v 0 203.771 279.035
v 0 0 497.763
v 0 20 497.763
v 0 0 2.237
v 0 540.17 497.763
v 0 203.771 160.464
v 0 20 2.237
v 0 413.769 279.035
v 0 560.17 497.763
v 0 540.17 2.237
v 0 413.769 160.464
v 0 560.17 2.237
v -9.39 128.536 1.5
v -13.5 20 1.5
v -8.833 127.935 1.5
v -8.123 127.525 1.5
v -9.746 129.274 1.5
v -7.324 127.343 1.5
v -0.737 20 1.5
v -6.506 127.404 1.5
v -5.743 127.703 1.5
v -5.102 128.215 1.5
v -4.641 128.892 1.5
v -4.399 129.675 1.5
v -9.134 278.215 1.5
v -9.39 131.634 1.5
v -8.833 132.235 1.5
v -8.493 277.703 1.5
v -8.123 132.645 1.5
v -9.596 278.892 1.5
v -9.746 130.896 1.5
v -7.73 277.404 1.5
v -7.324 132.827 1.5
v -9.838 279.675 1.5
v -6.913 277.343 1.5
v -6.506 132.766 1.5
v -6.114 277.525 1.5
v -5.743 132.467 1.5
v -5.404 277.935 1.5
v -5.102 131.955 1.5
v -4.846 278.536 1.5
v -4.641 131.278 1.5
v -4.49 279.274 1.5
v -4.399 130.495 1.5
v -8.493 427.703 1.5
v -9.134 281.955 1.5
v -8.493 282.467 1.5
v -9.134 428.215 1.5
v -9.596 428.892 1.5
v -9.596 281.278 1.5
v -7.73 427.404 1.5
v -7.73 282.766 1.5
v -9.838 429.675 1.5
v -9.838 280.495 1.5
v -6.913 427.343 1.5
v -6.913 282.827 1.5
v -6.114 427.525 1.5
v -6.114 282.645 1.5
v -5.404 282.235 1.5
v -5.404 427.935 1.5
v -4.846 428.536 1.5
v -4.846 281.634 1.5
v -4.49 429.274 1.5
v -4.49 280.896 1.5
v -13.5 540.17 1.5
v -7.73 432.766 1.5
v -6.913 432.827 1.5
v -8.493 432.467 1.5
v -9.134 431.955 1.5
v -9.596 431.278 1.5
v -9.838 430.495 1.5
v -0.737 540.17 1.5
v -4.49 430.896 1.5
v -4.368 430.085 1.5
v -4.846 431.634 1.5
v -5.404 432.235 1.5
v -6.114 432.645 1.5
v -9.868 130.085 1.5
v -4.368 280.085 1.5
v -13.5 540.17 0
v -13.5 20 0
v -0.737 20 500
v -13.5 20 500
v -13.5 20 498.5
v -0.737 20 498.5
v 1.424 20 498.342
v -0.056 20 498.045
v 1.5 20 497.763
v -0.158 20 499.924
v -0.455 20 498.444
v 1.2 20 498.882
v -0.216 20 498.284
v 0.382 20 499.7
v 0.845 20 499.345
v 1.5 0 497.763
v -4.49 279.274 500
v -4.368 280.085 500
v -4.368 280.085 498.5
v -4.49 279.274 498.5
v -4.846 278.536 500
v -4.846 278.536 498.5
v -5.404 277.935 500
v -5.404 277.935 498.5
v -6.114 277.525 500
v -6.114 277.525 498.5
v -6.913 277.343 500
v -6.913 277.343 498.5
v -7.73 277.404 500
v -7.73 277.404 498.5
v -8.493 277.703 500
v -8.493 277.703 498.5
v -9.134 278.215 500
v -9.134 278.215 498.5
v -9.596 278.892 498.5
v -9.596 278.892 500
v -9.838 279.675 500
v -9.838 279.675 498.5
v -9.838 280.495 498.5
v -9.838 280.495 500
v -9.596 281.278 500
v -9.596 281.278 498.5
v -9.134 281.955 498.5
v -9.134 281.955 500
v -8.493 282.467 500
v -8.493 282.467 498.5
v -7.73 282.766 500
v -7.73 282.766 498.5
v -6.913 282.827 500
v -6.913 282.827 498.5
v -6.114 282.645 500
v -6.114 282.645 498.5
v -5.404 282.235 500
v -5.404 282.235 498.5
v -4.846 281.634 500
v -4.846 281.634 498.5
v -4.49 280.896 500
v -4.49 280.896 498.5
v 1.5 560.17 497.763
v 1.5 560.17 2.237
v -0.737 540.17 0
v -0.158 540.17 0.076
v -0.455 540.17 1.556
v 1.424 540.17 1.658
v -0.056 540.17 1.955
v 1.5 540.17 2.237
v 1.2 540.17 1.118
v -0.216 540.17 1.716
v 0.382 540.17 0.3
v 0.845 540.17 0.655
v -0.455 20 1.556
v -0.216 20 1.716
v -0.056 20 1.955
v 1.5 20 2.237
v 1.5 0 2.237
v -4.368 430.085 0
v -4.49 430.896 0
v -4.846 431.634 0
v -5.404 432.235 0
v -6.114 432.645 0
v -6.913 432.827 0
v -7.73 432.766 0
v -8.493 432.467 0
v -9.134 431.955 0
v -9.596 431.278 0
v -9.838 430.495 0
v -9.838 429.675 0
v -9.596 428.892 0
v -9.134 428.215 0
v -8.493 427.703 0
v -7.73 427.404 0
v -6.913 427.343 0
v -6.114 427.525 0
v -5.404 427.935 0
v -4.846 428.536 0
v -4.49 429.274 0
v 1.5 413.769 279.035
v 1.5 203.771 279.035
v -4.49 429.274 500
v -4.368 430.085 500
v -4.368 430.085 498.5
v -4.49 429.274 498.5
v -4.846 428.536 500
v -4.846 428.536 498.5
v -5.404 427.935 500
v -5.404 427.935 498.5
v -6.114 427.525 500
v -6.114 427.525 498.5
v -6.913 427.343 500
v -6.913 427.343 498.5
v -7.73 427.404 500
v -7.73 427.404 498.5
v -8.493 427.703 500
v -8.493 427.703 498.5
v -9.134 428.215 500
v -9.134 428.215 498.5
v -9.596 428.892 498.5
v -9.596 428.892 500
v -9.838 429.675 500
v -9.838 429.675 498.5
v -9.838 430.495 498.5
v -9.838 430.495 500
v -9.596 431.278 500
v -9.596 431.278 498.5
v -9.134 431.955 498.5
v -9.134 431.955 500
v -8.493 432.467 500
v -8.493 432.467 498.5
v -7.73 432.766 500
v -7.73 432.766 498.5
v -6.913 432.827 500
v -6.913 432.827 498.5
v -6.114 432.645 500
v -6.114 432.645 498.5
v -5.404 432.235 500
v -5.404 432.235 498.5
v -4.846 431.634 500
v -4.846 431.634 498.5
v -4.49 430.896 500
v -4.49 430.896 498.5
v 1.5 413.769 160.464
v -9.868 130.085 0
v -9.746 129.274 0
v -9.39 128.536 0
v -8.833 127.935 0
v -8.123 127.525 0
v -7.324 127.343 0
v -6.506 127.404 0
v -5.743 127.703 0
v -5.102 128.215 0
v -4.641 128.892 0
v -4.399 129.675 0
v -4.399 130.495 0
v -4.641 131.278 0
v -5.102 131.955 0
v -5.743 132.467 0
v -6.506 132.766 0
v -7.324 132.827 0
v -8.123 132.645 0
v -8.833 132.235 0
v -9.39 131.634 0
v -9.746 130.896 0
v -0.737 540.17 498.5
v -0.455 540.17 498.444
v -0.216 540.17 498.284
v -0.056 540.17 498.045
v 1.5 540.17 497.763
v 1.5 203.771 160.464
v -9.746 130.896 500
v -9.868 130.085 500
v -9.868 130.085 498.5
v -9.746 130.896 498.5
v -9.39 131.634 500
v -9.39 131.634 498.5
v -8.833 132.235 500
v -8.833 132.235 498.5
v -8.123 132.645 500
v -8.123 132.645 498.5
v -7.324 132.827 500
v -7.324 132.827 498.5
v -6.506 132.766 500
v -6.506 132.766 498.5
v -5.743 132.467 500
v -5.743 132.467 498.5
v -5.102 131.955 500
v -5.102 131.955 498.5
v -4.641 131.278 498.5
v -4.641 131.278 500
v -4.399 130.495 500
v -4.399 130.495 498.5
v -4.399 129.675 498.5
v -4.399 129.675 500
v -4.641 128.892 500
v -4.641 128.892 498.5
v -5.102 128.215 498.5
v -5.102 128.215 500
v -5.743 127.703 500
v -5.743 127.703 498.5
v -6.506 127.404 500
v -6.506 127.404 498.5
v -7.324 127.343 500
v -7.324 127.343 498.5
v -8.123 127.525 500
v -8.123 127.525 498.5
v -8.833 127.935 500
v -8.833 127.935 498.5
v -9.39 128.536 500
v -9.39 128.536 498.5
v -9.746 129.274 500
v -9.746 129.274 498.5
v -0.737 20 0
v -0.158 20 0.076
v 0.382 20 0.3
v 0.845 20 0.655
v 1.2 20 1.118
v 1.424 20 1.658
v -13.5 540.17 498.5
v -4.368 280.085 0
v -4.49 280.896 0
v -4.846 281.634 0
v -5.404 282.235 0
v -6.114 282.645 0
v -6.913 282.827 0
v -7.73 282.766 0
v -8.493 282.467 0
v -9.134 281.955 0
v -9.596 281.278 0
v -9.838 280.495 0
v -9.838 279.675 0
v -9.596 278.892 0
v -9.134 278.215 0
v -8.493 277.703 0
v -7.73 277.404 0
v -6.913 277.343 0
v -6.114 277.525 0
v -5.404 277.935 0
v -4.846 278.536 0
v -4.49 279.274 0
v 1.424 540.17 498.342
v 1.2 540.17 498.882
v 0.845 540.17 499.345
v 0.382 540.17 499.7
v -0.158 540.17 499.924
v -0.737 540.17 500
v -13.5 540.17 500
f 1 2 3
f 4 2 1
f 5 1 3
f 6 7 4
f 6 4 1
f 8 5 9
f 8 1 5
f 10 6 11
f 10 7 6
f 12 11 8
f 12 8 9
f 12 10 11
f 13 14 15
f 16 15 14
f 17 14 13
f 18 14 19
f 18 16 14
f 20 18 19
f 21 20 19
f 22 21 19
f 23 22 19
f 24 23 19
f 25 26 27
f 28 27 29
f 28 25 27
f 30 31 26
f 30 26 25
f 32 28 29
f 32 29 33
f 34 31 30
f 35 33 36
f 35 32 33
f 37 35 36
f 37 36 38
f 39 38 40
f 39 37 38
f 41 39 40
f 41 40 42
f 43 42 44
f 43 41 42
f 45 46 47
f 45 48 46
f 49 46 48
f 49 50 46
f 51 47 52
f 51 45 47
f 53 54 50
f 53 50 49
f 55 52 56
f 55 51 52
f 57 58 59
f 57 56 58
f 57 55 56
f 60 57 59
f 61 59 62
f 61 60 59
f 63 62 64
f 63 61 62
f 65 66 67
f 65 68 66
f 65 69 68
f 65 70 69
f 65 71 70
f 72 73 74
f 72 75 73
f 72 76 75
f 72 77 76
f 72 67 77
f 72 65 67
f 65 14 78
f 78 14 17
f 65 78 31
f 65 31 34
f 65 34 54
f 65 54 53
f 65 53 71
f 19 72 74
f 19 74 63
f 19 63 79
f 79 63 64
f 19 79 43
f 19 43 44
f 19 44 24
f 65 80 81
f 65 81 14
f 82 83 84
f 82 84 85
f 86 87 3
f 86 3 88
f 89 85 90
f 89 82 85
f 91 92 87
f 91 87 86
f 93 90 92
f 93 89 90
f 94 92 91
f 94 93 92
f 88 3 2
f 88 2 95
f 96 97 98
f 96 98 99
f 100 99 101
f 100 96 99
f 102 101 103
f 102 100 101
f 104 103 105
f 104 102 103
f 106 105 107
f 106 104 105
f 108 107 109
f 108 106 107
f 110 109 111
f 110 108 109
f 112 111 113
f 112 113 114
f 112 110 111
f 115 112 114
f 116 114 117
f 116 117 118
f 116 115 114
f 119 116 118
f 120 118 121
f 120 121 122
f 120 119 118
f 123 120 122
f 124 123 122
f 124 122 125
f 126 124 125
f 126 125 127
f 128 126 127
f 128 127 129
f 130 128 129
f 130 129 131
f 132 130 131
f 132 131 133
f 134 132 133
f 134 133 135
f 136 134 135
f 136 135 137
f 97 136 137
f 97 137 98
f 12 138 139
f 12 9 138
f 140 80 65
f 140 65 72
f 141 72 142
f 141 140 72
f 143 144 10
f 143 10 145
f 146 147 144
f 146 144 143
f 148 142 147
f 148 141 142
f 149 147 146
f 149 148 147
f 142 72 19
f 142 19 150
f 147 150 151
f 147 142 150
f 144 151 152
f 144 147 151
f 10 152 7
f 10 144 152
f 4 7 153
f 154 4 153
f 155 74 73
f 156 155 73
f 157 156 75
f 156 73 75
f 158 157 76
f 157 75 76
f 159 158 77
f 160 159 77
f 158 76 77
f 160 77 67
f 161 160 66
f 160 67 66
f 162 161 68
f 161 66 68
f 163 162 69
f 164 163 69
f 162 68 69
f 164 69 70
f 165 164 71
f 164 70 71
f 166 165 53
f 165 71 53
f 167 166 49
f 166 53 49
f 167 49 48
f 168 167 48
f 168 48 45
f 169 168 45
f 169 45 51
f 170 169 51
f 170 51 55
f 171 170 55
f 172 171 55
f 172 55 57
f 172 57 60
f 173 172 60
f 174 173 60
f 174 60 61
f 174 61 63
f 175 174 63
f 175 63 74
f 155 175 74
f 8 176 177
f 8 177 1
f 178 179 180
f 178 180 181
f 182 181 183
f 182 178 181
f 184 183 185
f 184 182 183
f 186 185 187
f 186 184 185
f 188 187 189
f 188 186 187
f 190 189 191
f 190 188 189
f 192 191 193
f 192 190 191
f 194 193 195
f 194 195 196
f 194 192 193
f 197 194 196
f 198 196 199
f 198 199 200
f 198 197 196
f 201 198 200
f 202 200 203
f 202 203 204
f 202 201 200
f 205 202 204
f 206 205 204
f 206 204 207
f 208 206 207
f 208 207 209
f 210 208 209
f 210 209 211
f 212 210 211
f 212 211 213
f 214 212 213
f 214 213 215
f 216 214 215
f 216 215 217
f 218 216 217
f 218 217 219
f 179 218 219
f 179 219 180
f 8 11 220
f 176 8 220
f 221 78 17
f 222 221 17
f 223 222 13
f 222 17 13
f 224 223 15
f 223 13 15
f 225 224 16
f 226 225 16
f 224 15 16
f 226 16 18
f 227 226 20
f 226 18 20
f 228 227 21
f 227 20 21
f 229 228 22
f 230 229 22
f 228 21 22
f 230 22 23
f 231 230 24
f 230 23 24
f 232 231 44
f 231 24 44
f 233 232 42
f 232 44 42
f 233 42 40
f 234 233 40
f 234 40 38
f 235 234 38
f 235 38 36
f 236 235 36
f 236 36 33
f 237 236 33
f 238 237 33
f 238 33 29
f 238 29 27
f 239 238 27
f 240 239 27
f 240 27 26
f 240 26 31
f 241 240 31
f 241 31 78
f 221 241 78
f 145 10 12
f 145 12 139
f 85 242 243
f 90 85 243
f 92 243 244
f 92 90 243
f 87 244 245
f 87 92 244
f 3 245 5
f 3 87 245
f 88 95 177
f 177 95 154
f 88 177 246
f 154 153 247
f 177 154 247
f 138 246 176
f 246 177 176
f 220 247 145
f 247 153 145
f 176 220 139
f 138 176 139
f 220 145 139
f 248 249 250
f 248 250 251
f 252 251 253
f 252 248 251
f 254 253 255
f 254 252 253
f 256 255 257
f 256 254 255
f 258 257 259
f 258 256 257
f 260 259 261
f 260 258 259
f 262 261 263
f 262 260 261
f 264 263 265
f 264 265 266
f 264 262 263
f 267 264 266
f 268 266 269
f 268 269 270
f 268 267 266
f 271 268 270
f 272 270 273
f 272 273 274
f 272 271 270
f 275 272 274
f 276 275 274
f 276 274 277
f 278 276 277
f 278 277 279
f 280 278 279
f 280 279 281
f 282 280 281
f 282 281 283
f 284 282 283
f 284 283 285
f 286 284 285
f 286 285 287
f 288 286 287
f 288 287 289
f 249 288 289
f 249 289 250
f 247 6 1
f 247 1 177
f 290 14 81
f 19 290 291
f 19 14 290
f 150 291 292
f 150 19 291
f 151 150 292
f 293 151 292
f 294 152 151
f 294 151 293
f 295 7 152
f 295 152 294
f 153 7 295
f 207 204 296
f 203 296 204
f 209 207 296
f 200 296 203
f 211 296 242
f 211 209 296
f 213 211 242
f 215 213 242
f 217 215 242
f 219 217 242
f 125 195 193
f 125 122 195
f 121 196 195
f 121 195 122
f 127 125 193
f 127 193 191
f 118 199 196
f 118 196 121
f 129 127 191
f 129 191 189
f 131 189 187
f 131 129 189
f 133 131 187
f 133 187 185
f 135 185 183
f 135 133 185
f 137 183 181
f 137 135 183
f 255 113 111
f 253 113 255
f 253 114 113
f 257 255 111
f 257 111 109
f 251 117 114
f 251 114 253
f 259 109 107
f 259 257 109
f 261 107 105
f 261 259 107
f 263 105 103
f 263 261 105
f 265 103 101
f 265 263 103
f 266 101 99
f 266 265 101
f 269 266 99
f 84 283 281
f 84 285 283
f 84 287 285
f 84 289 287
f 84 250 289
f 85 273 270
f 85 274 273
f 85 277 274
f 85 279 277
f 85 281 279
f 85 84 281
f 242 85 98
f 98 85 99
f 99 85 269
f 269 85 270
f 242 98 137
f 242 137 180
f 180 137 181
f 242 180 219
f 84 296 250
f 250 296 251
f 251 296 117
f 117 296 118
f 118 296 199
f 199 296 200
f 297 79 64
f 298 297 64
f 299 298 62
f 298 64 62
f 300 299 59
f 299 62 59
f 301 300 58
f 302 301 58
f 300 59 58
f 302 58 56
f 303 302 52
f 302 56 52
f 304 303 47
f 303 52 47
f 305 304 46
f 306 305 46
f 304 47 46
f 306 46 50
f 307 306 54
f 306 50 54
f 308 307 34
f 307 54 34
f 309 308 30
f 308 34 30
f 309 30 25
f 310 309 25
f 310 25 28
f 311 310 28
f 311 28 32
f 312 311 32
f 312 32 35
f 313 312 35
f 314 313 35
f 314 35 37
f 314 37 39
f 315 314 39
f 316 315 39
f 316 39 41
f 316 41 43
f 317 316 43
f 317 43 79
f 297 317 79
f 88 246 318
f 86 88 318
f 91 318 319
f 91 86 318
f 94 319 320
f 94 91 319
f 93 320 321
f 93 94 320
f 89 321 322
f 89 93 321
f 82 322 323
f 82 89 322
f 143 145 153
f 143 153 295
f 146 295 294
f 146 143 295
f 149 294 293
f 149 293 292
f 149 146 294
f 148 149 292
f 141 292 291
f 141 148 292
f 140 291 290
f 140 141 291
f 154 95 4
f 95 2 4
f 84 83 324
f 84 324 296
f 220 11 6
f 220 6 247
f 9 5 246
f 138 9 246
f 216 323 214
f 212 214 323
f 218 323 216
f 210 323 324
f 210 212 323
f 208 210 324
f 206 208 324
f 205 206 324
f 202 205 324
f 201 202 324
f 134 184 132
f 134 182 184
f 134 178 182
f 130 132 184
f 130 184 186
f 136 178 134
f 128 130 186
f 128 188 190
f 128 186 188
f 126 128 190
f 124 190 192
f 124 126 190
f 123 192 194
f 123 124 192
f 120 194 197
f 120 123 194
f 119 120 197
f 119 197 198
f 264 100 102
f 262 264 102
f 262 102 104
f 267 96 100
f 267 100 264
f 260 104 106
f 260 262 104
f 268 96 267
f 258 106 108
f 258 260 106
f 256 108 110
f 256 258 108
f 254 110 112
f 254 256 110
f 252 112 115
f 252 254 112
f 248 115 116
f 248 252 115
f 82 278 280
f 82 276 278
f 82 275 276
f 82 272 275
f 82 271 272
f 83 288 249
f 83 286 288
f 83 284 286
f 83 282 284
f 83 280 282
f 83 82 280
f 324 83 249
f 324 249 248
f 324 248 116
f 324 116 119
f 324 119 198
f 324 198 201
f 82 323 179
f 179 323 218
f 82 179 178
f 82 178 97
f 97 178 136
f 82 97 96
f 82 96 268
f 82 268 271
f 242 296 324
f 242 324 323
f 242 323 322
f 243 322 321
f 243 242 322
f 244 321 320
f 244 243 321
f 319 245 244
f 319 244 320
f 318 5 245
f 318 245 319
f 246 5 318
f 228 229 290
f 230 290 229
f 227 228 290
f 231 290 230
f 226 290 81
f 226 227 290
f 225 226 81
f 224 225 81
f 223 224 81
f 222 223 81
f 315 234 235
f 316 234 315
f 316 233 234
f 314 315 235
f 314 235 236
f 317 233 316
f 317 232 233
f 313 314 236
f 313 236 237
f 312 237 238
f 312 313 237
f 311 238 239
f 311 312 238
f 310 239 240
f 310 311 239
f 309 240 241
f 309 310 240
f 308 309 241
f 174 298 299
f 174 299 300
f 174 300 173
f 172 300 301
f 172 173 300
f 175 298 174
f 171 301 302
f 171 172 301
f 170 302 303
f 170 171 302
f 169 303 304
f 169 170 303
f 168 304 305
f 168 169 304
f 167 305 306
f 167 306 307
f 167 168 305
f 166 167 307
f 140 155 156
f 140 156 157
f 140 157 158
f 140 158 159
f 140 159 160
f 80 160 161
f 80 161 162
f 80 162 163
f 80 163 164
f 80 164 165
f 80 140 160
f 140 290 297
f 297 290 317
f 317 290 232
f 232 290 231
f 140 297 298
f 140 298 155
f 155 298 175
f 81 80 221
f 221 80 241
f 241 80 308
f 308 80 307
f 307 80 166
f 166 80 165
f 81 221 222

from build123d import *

# Parameters (mm, degrees)
SKETCH_1_W                       = 1.5
SKETCH_1_H                       = 560.17
SM_BASE_FLANGE_1_DEPTH           = 500
SKETCH_6_W                       = 317.570371398
SKETCH_6_H                       = 336.908787646
CUT_EXTRUDE_1_DEPTH              = 10
SKETCH_7_W                       = 1.5
SKETCH_7_H                       = 317.570371398
EXTRUDE_1_DEPTH                  = 34.77
SKETCH_8_W                       = 1.5
SKETCH_8_H                       = 317.570371398
EXTRUDE_2_DEPTH                  = 92.14
SKETCH_9_W                       = 1.5
SKETCH_9_H                       = 209.998787646
EXTRUDE_3_DEPTH                  = 126
SKETCH_10_W                      = 1.5
SKETCH_10_H                      = 209.998787646
EXTRUDE_4_DEPTH                  = 73
SM_EDGE_FLANGE_1_STRIP_W         = 7.4732
SM_EDGE_FLANGE_1_STRIP_H         = 1.5
SM_EDGE_FLANGE_1_STRIP_CUT_DEPTH = 560.17
SM_EDGE_FLANGE_1_DEPTH           = 560.17
SM_EDGE_FLANGE_2_STRIP_W         = 7.4732
SM_EDGE_FLANGE_2_STRIP_H         = 1.5
SM_EDGE_FLANGE_2_STRIP_CUT_DEPTH = 560.17
SM_EDGE_FLANGE_2_DEPTH           = 560.17
SKETCH_19_W                      = 22.446307896
SKETCH_19_H                      = 4.345643328
SKETCH_19_H_2                    = 10.457116237
CUT_EXTRUDE_2_DEPTH              = 20
SKETCH_20_W                      = 19.209439619
SKETCH_20_H                      = 11.495536561
SKETCH_20_W_2                    = 27.208670792
SKETCH_20_H_2                    = 7.195465163
CUT_EXTRUDE_3_DEPTH              = 20
SKETCH_21_R                      = 2.75
CUT_EXTRUDE_4_DEPTH              = 20
CUT_EXTRUDE_START                = -10
SKETCH_22_R                      = 2.75
CUT_EXTRUDE_5_DEPTH              = 10


# Sheet-metal steps are written as plain solids
with BuildPart() as part:
    # Sketch 1 → 基体-法兰1 (new body)
    with BuildSketch(Plane.XY):
        with Locations((0.75, 280.085)):
            Rectangle(SKETCH_1_W, SKETCH_1_H)
    extrude(amount=SM_BASE_FLANGE_1_DEPTH)

    # 草图6 → 切除-拉伸1 (cut)
    with BuildSketch(Plane(origin=(1.5, 0, 0), x_dir=(0, 0, -1), z_dir=(1, 0, 0))):
        with Locations((-246.249491055, 280.085)):
            Rectangle(SKETCH_6_W, SKETCH_6_H)
    extrude(amount=-CUT_EXTRUDE_1_DEPTH, mode=Mode.SUBTRACT)

    # 草图7 → 凸台-拉伸1 (add)
    with BuildSketch(Plane.XZ.offset(-448.539393823)):
        with Locations((0.75, 246.249491055)):
            Rectangle(SKETCH_7_W, SKETCH_7_H)
    extrude(amount=EXTRUDE_1_DEPTH)

    # 草图8 → 凸台-拉伸2 (add)
    with BuildSketch(Plane(origin=(0, 111.630606177, 0), x_dir=(1, 0, 0), z_dir=(0, 1, 0))):
        with Locations((0.75, -246.249491055)):
            Rectangle(SKETCH_8_W, SKETCH_8_H)
    extrude(amount=EXTRUDE_2_DEPTH)

    # 草图9 → 凸台-拉伸3 (add)
    with BuildSketch(Plane(origin=(0, 0, 405.034676754), x_dir=(-1, 0, 0), z_dir=(0, 0, -1))):
        with Locations((-0.75, 308.77)):
            Rectangle(SKETCH_9_W, SKETCH_9_H)
    extrude(amount=EXTRUDE_3_DEPTH)

    # 草图10 → 凸台-拉伸4 (add)
    with BuildSketch(Plane.XY.offset(87.464305356)):
        with Locations((0.75, 308.77)):
            Rectangle(SKETCH_10_W, SKETCH_10_H)
    extrude(amount=EXTRUDE_4_DEPTH)

    # 边线-法兰1 strip (across the edge) → 边线-法兰1 strip cut (cut)
    with BuildSketch(Plane(origin=(0, 0, 500), x_dir=(0, 0, -1), z_dir=(0, 1, 0))):
        with Locations((-1.5, -0.75)):
            Rectangle(SM_EDGE_FLANGE_1_STRIP_W, SM_EDGE_FLANGE_1_STRIP_H)
    extrude(amount=SM_EDGE_FLANGE_1_STRIP_CUT_DEPTH, mode=Mode.SUBTRACT)

    # 边线-法兰1 section (across the edge) → 边线-法兰1 (add)
    with BuildSketch(Plane(origin=(0, 0, 500), x_dir=(0, 0, -1), z_dir=(0, 1, 0))):
        with BuildLine():
            Line((0, 0.7366), (0, 13.5))
            Line((0, 13.5), (1.5, 13.5))
            Line((1.5, 13.5), (1.5, 0.7366))
            ThreePointArc((1.5, 0.7366), (1.715745145, 0.215745145), (2.2366, 0))
            Line((2.2366, 0), (2.2366, -1.5))
            ThreePointArc((2.2366, -1.5), (0.655084973, -0.844915027), (0, 0.7366))
        make_face()
    extrude(amount=SM_EDGE_FLANGE_1_DEPTH)

    # 边线-法兰2 strip (across the edge) → 边线-法兰2 strip cut (cut)
    with BuildSketch(Plane(origin=(0, 560.17, 0), x_dir=(0, 0, 1), z_dir=(0, -1, 0))):
        with Locations((-1.5, -0.75)):
            Rectangle(SM_EDGE_FLANGE_2_STRIP_W, SM_EDGE_FLANGE_2_STRIP_H)
    extrude(amount=SM_EDGE_FLANGE_2_STRIP_CUT_DEPTH, mode=Mode.SUBTRACT)

    # 边线-法兰2 section (across the edge) → 边线-法兰2 (add)
    with BuildSketch(Plane(origin=(0, 560.17, 0), x_dir=(0, 0, 1), z_dir=(0, -1, 0))):
        with BuildLine():
            Line((0, 0.7366), (0, 13.5))
            Line((0, 13.5), (1.5, 13.5))
            Line((1.5, 13.5), (1.5, 0.7366))
            ThreePointArc((1.5, 0.7366), (1.715745145, 0.215745145), (2.2366, 0))
            Line((2.2366, 0), (2.2366, -1.5))
            ThreePointArc((2.2366, -1.5), (0.655084973, -0.844915027), (0, 0.7366))
        make_face()
    extrude(amount=SM_EDGE_FLANGE_2_DEPTH)

    # 草图19 → 切除-拉伸2 (cut)
    with BuildSketch(Plane.XZ):
        with Locations((-9.723153948, 0.063778336)):
            Rectangle(SKETCH_19_W, SKETCH_19_H)
        with Locations((-9.723153948, 502.991958119)):
            Rectangle(SKETCH_19_W, SKETCH_19_H_2)
    extrude(amount=-CUT_EXTRUDE_2_DEPTH, mode=Mode.SUBTRACT)

    # 草图20 → 切除-拉伸3 (cut)
    with BuildSketch(Plane(origin=(0, 560.17, 0), x_dir=(1, 0, 0), z_dir=(0, 1, 0))):
        with Locations((-8.10471981, -503.511168281)):
            Rectangle(SKETCH_20_W, SKETCH_20_H)
        with Locations((-12.104335396, 1.361132582)):
            Rectangle(SKETCH_20_W_2, SKETCH_20_H_2)
    extrude(amount=-CUT_EXTRUDE_3_DEPTH, mode=Mode.SUBTRACT)

    # 草图21 → 切除-拉伸4 (cut)
    with BuildSketch(Plane.XY.offset(1.5)):
        with Locations((-7.1183, 430.085)):
            Circle(SKETCH_21_R)
        with Locations((-7.1183, 280.085)):
            Circle(SKETCH_21_R)
        with Locations(Location((-7.1183, 130.085, 0), (0, 0, 180))):
            Circle(SKETCH_21_R)
    extrude(amount=-CUT_EXTRUDE_4_DEPTH, mode=Mode.SUBTRACT)

    # 草图22 → 切除-拉伸5 (cut)
    with BuildSketch(Plane(origin=(0, 0, 498.5), x_dir=(-1, 0, 0), z_dir=(0, 0, -1)).offset(CUT_EXTRUDE_START)):
        with Locations(Location((7.1183, 430.085, 0), (0, 0, 180))):
            Circle(SKETCH_22_R)
        with Locations(Location((7.1183, 280.085, 0), (0, 0, 180))):
            Circle(SKETCH_22_R)
        with Locations((7.1183, 130.085)):
            Circle(SKETCH_22_R)
    extrude(amount=CUT_EXTRUDE_5_DEPTH, mode=Mode.SUBTRACT)


solid = part.part
